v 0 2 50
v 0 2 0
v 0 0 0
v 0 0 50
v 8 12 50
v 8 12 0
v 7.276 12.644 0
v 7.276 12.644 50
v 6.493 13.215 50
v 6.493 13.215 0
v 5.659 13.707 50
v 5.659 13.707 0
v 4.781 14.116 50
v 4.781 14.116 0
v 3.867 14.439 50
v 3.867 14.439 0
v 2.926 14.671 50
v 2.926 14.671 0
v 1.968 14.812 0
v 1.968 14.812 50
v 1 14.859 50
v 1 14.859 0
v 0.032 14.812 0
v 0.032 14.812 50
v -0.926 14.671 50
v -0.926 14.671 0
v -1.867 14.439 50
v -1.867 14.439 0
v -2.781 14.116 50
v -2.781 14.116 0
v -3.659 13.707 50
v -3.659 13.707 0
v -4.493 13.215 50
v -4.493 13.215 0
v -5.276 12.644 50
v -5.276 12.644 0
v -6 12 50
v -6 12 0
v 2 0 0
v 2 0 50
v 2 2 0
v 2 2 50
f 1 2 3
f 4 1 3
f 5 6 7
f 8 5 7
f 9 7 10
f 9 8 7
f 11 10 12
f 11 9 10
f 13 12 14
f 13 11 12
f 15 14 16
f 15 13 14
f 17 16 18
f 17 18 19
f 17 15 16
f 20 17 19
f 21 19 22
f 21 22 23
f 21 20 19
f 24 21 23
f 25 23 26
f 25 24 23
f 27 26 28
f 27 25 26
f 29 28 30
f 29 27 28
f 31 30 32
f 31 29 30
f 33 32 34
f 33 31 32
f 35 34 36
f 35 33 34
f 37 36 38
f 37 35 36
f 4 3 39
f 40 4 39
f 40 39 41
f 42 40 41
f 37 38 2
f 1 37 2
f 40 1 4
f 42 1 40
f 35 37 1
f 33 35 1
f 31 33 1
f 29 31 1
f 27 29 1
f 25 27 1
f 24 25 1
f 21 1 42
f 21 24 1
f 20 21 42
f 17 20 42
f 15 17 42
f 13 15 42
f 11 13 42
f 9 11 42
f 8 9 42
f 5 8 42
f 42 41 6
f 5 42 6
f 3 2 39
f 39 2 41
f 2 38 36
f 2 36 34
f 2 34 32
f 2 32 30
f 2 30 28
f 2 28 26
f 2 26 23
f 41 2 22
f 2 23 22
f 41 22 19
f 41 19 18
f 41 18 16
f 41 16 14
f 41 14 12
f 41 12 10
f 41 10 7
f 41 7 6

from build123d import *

# Parameters (mm, degrees)
BOSS_EXTRUDE1_DEPTH = 50
BOSS_EXTRUDE2_DEPTH = 50


with BuildPart() as part:
    # Sketch1 → Boss-Extrude1 (new body)
    with BuildSketch(Plane.XY):
        Polygon((0, 0), (2, 0), (2, 2), (8, 12), (-6, 12), (0, 2), align=None)
    extrude(amount=BOSS_EXTRUDE1_DEPTH)

    # Sketch2 → Boss-Extrude2 (add)
    with BuildSketch(Plane.XY.offset(50)):
        with BuildLine():
            Line((-6, 12), (8, 12))
            ThreePointArc((8, 12), (1, 14.858571571), (-6, 12))
        make_face()
    extrude(amount=-BOSS_EXTRUDE2_DEPTH)


solid = part.part
